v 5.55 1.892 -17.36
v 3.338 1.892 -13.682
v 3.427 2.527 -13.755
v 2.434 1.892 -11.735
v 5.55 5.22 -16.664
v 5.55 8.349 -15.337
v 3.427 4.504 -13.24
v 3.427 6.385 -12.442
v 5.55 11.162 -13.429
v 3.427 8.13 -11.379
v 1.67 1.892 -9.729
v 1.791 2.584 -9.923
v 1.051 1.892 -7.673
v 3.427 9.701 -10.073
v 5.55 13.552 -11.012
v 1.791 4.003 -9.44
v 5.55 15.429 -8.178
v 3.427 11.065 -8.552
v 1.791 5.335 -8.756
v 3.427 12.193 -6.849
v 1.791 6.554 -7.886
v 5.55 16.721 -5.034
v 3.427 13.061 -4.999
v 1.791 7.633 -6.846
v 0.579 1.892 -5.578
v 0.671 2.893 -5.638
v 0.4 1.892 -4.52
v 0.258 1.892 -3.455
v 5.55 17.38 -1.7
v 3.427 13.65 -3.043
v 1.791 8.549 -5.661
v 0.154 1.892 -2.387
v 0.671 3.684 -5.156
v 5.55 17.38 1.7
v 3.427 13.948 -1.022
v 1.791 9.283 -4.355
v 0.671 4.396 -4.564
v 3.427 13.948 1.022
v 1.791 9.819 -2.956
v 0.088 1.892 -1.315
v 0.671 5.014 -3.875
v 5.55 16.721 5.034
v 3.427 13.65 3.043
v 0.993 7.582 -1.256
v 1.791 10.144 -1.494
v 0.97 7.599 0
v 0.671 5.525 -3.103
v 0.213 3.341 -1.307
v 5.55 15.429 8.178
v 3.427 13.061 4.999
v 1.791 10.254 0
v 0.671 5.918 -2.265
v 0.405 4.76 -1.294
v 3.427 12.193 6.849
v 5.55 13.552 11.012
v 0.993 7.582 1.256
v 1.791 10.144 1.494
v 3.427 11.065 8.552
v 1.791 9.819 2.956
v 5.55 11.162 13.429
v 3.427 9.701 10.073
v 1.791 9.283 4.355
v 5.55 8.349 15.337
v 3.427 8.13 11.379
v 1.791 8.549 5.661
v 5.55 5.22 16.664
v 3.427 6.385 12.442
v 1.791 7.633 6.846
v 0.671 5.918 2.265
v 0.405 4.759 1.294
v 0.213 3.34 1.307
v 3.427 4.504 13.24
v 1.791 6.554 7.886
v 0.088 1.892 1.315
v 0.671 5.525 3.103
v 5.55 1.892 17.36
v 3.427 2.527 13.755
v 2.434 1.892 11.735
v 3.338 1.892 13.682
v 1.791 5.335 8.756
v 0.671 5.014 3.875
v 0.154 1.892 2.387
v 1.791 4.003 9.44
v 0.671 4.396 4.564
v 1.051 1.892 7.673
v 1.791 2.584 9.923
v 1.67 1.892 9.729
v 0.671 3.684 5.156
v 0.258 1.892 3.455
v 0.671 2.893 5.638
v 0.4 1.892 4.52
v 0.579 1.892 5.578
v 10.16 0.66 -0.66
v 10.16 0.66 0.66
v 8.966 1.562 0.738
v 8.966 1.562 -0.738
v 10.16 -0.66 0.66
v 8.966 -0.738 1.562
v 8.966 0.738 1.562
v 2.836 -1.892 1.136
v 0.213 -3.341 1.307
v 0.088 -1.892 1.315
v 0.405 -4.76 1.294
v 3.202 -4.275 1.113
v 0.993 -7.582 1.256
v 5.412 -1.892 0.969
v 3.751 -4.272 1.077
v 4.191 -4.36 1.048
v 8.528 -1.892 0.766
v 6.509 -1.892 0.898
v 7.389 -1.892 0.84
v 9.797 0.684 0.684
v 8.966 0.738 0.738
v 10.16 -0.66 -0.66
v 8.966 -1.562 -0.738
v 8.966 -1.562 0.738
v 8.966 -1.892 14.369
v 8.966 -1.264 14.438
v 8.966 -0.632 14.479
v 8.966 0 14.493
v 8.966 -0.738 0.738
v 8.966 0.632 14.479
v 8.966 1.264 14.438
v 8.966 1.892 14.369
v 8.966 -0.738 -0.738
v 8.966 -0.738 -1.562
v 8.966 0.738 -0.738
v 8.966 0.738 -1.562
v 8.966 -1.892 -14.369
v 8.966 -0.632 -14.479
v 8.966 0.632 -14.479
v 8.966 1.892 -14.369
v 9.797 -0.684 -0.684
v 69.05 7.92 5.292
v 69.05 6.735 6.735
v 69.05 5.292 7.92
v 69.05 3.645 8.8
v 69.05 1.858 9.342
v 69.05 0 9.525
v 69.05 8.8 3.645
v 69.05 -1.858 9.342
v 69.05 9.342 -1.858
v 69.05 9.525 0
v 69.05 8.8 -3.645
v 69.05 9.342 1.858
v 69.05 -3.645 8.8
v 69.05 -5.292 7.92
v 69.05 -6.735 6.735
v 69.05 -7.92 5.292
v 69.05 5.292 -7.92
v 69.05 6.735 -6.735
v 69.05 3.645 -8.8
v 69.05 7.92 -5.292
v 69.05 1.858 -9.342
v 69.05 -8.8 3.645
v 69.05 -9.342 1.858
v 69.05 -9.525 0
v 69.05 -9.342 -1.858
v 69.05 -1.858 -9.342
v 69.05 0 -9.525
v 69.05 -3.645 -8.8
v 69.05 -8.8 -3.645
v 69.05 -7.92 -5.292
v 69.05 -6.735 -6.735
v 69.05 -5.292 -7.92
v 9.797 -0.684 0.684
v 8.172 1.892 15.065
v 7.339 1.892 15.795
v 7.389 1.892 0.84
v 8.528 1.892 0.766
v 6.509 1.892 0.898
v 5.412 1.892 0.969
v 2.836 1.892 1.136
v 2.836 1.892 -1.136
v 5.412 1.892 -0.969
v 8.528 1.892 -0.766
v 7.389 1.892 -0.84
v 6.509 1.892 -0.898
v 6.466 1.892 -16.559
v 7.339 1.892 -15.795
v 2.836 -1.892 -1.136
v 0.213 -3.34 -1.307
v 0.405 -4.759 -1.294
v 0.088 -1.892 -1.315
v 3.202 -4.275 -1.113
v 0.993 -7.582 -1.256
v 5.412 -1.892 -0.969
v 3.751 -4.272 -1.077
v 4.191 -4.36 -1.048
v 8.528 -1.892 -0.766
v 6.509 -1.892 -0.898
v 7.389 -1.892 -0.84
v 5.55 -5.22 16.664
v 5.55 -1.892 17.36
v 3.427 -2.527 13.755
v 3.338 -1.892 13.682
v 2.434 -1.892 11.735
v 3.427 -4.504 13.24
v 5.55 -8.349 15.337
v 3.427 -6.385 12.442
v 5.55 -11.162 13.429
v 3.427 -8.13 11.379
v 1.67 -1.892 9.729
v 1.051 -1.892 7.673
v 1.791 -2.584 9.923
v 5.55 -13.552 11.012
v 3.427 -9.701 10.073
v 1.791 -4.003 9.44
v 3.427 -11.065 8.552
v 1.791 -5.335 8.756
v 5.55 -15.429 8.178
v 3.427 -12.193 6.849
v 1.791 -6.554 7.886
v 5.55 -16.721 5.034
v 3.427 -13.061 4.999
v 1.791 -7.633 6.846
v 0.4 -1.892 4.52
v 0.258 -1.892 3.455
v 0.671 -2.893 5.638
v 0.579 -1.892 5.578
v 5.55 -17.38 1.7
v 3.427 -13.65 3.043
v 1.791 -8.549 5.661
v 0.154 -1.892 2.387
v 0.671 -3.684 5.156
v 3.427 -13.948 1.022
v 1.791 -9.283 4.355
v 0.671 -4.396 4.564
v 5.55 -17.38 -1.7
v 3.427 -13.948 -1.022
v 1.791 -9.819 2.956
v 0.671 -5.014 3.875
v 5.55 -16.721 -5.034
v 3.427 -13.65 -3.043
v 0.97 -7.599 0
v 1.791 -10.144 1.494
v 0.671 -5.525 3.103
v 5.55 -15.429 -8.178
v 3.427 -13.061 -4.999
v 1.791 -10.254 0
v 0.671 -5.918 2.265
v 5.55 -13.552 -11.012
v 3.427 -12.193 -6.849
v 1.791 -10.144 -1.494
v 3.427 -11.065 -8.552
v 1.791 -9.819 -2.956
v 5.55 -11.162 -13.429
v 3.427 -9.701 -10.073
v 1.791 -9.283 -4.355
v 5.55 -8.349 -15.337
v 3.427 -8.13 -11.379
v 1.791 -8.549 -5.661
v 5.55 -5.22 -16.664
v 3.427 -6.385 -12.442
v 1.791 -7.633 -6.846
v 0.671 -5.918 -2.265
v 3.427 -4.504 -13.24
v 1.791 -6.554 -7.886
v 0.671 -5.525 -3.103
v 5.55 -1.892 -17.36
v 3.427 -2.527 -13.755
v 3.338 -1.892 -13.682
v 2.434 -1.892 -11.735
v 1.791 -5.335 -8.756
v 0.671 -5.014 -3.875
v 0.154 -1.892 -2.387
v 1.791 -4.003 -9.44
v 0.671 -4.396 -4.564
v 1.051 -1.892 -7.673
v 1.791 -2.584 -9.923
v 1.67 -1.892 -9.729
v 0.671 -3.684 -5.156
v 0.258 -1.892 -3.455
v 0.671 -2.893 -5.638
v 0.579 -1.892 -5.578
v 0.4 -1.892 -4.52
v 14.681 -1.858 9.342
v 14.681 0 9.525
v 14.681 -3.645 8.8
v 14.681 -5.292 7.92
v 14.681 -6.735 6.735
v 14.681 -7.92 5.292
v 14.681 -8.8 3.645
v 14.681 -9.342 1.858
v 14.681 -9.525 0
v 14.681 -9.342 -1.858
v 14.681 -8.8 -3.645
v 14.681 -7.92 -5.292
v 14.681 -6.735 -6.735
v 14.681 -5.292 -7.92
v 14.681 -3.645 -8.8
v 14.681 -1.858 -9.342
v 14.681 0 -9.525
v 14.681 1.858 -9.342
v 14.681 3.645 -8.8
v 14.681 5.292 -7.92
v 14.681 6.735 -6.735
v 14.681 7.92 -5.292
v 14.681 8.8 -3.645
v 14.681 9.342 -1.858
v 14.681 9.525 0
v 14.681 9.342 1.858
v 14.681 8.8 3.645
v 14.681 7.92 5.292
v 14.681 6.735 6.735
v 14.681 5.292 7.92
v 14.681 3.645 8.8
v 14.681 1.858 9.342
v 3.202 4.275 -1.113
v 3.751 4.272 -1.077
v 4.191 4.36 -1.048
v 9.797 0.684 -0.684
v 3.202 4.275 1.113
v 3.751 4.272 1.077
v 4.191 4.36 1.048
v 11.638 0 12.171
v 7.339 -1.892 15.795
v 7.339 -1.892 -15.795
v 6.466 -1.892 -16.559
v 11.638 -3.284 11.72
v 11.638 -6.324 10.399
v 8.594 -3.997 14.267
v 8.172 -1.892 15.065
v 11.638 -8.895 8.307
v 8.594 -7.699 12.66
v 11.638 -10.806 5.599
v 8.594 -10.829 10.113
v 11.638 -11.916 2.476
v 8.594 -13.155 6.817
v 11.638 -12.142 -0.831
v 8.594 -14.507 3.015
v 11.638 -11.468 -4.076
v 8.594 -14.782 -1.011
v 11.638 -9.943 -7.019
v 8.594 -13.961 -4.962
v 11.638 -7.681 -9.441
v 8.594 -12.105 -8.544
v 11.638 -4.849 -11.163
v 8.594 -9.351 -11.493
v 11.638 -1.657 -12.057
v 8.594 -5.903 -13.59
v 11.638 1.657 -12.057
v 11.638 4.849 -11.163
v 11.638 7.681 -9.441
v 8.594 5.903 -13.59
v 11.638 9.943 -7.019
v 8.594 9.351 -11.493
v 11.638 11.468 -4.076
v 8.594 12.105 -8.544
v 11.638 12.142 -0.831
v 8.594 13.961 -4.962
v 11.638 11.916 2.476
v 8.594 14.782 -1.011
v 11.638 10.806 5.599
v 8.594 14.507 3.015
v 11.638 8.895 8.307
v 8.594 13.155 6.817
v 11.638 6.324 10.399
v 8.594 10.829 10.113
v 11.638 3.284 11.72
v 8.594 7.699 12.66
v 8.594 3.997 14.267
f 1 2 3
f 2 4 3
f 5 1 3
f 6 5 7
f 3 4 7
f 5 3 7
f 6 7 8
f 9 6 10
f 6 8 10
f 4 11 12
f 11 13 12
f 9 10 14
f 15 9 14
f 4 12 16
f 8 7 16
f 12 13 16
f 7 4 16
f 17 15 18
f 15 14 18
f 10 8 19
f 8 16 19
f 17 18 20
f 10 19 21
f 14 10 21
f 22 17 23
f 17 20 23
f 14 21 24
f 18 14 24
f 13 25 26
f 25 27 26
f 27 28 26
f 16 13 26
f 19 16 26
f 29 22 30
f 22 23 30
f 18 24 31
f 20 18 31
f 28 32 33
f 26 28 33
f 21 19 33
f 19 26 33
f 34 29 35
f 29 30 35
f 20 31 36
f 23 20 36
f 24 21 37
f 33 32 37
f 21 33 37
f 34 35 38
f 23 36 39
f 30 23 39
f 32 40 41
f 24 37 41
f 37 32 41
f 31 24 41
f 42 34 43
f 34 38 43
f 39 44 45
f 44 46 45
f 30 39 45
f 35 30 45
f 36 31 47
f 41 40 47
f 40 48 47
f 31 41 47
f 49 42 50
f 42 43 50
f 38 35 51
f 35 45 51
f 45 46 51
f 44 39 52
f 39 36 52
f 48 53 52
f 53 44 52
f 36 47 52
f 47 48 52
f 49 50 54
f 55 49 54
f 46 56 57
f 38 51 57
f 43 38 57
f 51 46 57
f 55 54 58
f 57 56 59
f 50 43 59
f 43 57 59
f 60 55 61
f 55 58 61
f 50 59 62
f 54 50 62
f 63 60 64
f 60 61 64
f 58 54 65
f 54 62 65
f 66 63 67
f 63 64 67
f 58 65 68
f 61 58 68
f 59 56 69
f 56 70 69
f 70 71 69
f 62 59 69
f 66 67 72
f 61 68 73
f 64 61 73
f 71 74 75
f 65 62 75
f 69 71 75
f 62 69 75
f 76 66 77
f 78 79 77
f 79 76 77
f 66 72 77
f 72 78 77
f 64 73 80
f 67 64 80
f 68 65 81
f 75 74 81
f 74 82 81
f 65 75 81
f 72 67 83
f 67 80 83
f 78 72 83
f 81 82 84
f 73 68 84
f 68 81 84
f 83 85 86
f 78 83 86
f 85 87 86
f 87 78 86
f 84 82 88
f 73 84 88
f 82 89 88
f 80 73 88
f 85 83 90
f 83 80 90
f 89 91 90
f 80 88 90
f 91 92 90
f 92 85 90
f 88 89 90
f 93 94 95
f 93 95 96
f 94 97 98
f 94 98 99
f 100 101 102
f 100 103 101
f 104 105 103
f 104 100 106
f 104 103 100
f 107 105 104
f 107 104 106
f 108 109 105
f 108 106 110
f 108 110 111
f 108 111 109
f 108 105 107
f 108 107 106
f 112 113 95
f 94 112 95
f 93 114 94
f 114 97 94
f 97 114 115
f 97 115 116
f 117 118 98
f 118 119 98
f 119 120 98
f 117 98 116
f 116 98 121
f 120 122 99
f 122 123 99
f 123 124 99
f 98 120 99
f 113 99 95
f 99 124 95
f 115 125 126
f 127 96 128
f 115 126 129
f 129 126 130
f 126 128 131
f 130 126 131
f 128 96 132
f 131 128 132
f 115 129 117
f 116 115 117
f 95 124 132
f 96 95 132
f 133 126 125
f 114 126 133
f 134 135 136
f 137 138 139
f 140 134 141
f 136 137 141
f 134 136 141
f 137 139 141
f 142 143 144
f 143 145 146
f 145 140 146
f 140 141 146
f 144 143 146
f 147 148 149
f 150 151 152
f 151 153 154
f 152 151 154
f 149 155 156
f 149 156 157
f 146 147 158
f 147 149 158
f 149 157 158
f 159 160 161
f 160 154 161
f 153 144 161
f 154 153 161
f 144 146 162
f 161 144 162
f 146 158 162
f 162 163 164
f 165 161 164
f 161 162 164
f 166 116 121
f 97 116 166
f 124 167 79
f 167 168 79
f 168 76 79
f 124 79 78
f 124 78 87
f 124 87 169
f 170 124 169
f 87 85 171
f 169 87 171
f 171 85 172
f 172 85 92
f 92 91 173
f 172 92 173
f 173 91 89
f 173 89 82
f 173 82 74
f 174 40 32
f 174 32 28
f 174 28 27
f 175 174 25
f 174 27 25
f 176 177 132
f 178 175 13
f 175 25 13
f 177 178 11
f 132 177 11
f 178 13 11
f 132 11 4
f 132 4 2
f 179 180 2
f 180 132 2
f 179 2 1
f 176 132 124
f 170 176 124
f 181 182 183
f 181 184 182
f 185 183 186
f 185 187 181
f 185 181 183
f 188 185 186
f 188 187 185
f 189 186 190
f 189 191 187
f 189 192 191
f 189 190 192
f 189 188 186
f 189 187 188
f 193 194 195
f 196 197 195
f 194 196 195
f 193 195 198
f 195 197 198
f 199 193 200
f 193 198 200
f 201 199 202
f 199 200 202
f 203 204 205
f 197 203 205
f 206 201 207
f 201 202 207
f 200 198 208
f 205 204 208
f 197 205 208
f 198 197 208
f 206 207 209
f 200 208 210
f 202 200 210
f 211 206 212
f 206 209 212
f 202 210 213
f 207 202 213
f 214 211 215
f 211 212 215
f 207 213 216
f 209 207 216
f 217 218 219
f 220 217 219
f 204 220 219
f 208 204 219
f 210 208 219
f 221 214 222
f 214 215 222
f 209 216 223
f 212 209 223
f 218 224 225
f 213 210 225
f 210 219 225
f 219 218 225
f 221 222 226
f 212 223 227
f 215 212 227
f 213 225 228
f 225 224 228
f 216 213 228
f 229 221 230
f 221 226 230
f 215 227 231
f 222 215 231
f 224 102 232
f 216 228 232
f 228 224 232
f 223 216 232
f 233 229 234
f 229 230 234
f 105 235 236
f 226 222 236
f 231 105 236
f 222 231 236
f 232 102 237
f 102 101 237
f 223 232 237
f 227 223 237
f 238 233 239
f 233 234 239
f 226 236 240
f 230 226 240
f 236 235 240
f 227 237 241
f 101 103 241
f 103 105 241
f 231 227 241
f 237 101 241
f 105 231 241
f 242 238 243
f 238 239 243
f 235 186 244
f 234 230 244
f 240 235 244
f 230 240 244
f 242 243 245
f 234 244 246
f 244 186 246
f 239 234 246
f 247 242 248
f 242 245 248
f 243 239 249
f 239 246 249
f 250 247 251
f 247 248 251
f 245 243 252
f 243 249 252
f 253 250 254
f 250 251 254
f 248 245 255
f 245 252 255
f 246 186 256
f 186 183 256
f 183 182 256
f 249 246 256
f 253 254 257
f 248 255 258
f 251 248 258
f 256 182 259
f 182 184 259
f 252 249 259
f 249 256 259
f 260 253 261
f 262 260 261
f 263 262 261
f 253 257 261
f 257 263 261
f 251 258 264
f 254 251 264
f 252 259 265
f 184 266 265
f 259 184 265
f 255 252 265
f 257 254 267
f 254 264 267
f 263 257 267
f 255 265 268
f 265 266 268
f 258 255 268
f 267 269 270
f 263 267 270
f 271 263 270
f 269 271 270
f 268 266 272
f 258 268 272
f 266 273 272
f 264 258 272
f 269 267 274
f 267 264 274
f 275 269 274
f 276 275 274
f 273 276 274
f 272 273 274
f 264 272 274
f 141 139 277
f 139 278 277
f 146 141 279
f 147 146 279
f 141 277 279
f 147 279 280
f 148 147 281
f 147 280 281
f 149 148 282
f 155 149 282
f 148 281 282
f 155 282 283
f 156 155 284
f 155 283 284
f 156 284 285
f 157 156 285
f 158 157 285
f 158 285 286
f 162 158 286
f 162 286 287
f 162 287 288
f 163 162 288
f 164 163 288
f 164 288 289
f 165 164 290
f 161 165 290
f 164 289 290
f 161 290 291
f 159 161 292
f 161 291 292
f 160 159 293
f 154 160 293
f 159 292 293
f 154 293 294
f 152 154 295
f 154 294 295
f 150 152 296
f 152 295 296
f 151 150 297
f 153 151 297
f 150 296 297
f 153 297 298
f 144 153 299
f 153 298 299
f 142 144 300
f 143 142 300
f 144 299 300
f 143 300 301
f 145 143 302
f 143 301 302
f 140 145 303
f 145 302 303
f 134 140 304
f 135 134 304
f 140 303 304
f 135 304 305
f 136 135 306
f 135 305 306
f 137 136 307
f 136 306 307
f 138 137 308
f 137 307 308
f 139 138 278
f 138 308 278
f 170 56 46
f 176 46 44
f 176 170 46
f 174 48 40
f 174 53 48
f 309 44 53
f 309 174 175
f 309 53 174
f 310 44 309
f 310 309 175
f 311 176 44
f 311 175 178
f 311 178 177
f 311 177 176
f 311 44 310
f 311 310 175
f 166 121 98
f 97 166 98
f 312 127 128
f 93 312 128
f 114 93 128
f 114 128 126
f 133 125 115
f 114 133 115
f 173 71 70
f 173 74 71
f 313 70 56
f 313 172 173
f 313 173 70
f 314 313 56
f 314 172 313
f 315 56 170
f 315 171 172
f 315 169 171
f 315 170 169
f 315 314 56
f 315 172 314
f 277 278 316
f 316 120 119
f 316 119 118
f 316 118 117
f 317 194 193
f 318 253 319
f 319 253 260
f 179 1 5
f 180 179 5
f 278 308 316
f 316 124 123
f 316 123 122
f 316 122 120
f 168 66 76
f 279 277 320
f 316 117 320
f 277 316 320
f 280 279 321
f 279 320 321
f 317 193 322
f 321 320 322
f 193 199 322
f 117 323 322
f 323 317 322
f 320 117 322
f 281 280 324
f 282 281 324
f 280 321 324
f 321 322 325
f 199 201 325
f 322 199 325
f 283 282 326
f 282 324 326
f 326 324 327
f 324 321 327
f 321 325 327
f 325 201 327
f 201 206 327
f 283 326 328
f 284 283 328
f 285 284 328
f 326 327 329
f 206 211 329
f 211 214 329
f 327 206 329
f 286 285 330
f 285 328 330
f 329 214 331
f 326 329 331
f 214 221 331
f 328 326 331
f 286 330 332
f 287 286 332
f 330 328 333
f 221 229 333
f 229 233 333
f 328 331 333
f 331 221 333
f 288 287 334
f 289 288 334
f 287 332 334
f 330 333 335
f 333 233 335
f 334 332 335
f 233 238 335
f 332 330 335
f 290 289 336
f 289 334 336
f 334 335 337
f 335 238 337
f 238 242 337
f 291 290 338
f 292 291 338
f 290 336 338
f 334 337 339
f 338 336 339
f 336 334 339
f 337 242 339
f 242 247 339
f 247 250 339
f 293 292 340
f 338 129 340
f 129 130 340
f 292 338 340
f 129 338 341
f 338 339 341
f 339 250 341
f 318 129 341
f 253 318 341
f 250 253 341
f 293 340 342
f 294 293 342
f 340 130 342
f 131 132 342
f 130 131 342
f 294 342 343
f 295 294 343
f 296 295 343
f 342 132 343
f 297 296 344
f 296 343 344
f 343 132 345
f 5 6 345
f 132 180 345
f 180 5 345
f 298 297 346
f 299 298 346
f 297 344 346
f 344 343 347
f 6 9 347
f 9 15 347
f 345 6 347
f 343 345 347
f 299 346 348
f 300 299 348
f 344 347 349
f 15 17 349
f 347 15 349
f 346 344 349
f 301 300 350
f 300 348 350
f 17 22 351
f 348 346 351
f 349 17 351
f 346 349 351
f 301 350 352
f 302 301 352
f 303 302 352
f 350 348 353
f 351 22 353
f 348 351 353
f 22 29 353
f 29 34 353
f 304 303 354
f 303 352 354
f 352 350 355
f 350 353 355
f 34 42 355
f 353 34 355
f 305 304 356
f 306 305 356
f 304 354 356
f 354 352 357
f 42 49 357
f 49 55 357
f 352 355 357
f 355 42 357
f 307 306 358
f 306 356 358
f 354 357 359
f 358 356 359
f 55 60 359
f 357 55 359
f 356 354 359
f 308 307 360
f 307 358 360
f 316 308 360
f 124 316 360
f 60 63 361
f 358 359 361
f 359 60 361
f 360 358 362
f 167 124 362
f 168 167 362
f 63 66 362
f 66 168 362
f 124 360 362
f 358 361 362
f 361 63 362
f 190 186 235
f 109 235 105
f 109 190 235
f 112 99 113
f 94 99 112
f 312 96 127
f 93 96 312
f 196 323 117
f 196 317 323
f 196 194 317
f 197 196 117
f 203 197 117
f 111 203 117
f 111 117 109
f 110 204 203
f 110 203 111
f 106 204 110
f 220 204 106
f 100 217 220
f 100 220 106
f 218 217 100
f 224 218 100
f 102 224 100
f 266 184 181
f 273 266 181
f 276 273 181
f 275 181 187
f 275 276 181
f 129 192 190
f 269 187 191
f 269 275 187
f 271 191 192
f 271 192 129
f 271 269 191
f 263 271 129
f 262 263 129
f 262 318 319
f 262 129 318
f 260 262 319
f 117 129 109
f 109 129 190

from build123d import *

# Parameters (mm, degrees)
SKETCH2_W         = 34.925
SKETCH2_H         = 3.7846
SLOT_DEPTH        = 8.9662
CIRPATTERN1_COUNT = 2
CIRPATTERN1_ANGLE = 90


with BuildPart() as part:
    # BodySke → Base-Revolve (revolve)
    with BuildSketch(Plane.XY, mode=Mode.PRIVATE) as base_revolve_sk:
        with BuildLine():
            Line((0, 0), (69.050150768, 0))
            Line((69.050150768, 0), (69.050150768, 9.525))
            Line((69.050150768, 9.525), (14.6812, 9.525))
            Line((14.6812, 9.525), (5.550150768, 17.4625))
            ThreePointArc((5.550150768, 17.4625), (1.420913597, 9.161646683), (0, 0))
        make_face()
    revolve(base_revolve_sk.sketch.rotate(Axis((-15.875, 0, 0), (1, 0, 0)), 90), axis=Axis((-15.875, 0, 0), (1, 0, 0)))

    # Sketch2 → Slot (cut)
    with BuildSketch(Plane(origin=(0, 0, 0), x_dir=(0, 0, -1), z_dir=(1, 0, 0))):
        Rectangle(SKETCH2_W, SKETCH2_H)
    extrude(amount=SLOT_DEPTH, mode=Mode.SUBTRACT)

    # Sketch3 → Cross section 0
    with BuildSketch(Plane(origin=(0, 0, 0), x_dir=(0, 0, -1), z_dir=(1, 0, 0))):
        with BuildLine():
            Line((1.3208, -8.3312), (-1.3208, -8.3312))
            Line((-1.3208, -8.3312), (-1.3208, 8.3312))
            Line((-1.3208, 8.3312), (1.3208, 8.3312))
            Line((1.3208, 8.3312), (1.3208, -8.3312))
        make_face()
    # Sketch4 → Cross section 1
    with BuildSketch(Plane(origin=(10.16, 0, 0), x_dir=(0, 0, -1), z_dir=(1, 0, 0))):
        with BuildLine():
            Line((0.6604, -0.6604), (-0.6604, -0.6604))
            Line((-0.6604, -0.6604), (-0.6604, 0.6604))
            Line((-0.6604, 0.6604), (0.6604, 0.6604))
            Line((0.6604, 0.6604), (0.6604, -0.6604))
        make_face()
    cross = loft(mode=Mode.SUBTRACT)

    # CirPattern1: Cross ×2 about axis
    cirpattern1_axis = Axis((0, 0, 0), (1, 0, 0))
    for i in range(1, CIRPATTERN1_COUNT):
        add(cross.rotate(cirpattern1_axis, i * CIRPATTERN1_ANGLE / (CIRPATTERN1_COUNT - 1)), mode=Mode.SUBTRACT)


solid = part.part
